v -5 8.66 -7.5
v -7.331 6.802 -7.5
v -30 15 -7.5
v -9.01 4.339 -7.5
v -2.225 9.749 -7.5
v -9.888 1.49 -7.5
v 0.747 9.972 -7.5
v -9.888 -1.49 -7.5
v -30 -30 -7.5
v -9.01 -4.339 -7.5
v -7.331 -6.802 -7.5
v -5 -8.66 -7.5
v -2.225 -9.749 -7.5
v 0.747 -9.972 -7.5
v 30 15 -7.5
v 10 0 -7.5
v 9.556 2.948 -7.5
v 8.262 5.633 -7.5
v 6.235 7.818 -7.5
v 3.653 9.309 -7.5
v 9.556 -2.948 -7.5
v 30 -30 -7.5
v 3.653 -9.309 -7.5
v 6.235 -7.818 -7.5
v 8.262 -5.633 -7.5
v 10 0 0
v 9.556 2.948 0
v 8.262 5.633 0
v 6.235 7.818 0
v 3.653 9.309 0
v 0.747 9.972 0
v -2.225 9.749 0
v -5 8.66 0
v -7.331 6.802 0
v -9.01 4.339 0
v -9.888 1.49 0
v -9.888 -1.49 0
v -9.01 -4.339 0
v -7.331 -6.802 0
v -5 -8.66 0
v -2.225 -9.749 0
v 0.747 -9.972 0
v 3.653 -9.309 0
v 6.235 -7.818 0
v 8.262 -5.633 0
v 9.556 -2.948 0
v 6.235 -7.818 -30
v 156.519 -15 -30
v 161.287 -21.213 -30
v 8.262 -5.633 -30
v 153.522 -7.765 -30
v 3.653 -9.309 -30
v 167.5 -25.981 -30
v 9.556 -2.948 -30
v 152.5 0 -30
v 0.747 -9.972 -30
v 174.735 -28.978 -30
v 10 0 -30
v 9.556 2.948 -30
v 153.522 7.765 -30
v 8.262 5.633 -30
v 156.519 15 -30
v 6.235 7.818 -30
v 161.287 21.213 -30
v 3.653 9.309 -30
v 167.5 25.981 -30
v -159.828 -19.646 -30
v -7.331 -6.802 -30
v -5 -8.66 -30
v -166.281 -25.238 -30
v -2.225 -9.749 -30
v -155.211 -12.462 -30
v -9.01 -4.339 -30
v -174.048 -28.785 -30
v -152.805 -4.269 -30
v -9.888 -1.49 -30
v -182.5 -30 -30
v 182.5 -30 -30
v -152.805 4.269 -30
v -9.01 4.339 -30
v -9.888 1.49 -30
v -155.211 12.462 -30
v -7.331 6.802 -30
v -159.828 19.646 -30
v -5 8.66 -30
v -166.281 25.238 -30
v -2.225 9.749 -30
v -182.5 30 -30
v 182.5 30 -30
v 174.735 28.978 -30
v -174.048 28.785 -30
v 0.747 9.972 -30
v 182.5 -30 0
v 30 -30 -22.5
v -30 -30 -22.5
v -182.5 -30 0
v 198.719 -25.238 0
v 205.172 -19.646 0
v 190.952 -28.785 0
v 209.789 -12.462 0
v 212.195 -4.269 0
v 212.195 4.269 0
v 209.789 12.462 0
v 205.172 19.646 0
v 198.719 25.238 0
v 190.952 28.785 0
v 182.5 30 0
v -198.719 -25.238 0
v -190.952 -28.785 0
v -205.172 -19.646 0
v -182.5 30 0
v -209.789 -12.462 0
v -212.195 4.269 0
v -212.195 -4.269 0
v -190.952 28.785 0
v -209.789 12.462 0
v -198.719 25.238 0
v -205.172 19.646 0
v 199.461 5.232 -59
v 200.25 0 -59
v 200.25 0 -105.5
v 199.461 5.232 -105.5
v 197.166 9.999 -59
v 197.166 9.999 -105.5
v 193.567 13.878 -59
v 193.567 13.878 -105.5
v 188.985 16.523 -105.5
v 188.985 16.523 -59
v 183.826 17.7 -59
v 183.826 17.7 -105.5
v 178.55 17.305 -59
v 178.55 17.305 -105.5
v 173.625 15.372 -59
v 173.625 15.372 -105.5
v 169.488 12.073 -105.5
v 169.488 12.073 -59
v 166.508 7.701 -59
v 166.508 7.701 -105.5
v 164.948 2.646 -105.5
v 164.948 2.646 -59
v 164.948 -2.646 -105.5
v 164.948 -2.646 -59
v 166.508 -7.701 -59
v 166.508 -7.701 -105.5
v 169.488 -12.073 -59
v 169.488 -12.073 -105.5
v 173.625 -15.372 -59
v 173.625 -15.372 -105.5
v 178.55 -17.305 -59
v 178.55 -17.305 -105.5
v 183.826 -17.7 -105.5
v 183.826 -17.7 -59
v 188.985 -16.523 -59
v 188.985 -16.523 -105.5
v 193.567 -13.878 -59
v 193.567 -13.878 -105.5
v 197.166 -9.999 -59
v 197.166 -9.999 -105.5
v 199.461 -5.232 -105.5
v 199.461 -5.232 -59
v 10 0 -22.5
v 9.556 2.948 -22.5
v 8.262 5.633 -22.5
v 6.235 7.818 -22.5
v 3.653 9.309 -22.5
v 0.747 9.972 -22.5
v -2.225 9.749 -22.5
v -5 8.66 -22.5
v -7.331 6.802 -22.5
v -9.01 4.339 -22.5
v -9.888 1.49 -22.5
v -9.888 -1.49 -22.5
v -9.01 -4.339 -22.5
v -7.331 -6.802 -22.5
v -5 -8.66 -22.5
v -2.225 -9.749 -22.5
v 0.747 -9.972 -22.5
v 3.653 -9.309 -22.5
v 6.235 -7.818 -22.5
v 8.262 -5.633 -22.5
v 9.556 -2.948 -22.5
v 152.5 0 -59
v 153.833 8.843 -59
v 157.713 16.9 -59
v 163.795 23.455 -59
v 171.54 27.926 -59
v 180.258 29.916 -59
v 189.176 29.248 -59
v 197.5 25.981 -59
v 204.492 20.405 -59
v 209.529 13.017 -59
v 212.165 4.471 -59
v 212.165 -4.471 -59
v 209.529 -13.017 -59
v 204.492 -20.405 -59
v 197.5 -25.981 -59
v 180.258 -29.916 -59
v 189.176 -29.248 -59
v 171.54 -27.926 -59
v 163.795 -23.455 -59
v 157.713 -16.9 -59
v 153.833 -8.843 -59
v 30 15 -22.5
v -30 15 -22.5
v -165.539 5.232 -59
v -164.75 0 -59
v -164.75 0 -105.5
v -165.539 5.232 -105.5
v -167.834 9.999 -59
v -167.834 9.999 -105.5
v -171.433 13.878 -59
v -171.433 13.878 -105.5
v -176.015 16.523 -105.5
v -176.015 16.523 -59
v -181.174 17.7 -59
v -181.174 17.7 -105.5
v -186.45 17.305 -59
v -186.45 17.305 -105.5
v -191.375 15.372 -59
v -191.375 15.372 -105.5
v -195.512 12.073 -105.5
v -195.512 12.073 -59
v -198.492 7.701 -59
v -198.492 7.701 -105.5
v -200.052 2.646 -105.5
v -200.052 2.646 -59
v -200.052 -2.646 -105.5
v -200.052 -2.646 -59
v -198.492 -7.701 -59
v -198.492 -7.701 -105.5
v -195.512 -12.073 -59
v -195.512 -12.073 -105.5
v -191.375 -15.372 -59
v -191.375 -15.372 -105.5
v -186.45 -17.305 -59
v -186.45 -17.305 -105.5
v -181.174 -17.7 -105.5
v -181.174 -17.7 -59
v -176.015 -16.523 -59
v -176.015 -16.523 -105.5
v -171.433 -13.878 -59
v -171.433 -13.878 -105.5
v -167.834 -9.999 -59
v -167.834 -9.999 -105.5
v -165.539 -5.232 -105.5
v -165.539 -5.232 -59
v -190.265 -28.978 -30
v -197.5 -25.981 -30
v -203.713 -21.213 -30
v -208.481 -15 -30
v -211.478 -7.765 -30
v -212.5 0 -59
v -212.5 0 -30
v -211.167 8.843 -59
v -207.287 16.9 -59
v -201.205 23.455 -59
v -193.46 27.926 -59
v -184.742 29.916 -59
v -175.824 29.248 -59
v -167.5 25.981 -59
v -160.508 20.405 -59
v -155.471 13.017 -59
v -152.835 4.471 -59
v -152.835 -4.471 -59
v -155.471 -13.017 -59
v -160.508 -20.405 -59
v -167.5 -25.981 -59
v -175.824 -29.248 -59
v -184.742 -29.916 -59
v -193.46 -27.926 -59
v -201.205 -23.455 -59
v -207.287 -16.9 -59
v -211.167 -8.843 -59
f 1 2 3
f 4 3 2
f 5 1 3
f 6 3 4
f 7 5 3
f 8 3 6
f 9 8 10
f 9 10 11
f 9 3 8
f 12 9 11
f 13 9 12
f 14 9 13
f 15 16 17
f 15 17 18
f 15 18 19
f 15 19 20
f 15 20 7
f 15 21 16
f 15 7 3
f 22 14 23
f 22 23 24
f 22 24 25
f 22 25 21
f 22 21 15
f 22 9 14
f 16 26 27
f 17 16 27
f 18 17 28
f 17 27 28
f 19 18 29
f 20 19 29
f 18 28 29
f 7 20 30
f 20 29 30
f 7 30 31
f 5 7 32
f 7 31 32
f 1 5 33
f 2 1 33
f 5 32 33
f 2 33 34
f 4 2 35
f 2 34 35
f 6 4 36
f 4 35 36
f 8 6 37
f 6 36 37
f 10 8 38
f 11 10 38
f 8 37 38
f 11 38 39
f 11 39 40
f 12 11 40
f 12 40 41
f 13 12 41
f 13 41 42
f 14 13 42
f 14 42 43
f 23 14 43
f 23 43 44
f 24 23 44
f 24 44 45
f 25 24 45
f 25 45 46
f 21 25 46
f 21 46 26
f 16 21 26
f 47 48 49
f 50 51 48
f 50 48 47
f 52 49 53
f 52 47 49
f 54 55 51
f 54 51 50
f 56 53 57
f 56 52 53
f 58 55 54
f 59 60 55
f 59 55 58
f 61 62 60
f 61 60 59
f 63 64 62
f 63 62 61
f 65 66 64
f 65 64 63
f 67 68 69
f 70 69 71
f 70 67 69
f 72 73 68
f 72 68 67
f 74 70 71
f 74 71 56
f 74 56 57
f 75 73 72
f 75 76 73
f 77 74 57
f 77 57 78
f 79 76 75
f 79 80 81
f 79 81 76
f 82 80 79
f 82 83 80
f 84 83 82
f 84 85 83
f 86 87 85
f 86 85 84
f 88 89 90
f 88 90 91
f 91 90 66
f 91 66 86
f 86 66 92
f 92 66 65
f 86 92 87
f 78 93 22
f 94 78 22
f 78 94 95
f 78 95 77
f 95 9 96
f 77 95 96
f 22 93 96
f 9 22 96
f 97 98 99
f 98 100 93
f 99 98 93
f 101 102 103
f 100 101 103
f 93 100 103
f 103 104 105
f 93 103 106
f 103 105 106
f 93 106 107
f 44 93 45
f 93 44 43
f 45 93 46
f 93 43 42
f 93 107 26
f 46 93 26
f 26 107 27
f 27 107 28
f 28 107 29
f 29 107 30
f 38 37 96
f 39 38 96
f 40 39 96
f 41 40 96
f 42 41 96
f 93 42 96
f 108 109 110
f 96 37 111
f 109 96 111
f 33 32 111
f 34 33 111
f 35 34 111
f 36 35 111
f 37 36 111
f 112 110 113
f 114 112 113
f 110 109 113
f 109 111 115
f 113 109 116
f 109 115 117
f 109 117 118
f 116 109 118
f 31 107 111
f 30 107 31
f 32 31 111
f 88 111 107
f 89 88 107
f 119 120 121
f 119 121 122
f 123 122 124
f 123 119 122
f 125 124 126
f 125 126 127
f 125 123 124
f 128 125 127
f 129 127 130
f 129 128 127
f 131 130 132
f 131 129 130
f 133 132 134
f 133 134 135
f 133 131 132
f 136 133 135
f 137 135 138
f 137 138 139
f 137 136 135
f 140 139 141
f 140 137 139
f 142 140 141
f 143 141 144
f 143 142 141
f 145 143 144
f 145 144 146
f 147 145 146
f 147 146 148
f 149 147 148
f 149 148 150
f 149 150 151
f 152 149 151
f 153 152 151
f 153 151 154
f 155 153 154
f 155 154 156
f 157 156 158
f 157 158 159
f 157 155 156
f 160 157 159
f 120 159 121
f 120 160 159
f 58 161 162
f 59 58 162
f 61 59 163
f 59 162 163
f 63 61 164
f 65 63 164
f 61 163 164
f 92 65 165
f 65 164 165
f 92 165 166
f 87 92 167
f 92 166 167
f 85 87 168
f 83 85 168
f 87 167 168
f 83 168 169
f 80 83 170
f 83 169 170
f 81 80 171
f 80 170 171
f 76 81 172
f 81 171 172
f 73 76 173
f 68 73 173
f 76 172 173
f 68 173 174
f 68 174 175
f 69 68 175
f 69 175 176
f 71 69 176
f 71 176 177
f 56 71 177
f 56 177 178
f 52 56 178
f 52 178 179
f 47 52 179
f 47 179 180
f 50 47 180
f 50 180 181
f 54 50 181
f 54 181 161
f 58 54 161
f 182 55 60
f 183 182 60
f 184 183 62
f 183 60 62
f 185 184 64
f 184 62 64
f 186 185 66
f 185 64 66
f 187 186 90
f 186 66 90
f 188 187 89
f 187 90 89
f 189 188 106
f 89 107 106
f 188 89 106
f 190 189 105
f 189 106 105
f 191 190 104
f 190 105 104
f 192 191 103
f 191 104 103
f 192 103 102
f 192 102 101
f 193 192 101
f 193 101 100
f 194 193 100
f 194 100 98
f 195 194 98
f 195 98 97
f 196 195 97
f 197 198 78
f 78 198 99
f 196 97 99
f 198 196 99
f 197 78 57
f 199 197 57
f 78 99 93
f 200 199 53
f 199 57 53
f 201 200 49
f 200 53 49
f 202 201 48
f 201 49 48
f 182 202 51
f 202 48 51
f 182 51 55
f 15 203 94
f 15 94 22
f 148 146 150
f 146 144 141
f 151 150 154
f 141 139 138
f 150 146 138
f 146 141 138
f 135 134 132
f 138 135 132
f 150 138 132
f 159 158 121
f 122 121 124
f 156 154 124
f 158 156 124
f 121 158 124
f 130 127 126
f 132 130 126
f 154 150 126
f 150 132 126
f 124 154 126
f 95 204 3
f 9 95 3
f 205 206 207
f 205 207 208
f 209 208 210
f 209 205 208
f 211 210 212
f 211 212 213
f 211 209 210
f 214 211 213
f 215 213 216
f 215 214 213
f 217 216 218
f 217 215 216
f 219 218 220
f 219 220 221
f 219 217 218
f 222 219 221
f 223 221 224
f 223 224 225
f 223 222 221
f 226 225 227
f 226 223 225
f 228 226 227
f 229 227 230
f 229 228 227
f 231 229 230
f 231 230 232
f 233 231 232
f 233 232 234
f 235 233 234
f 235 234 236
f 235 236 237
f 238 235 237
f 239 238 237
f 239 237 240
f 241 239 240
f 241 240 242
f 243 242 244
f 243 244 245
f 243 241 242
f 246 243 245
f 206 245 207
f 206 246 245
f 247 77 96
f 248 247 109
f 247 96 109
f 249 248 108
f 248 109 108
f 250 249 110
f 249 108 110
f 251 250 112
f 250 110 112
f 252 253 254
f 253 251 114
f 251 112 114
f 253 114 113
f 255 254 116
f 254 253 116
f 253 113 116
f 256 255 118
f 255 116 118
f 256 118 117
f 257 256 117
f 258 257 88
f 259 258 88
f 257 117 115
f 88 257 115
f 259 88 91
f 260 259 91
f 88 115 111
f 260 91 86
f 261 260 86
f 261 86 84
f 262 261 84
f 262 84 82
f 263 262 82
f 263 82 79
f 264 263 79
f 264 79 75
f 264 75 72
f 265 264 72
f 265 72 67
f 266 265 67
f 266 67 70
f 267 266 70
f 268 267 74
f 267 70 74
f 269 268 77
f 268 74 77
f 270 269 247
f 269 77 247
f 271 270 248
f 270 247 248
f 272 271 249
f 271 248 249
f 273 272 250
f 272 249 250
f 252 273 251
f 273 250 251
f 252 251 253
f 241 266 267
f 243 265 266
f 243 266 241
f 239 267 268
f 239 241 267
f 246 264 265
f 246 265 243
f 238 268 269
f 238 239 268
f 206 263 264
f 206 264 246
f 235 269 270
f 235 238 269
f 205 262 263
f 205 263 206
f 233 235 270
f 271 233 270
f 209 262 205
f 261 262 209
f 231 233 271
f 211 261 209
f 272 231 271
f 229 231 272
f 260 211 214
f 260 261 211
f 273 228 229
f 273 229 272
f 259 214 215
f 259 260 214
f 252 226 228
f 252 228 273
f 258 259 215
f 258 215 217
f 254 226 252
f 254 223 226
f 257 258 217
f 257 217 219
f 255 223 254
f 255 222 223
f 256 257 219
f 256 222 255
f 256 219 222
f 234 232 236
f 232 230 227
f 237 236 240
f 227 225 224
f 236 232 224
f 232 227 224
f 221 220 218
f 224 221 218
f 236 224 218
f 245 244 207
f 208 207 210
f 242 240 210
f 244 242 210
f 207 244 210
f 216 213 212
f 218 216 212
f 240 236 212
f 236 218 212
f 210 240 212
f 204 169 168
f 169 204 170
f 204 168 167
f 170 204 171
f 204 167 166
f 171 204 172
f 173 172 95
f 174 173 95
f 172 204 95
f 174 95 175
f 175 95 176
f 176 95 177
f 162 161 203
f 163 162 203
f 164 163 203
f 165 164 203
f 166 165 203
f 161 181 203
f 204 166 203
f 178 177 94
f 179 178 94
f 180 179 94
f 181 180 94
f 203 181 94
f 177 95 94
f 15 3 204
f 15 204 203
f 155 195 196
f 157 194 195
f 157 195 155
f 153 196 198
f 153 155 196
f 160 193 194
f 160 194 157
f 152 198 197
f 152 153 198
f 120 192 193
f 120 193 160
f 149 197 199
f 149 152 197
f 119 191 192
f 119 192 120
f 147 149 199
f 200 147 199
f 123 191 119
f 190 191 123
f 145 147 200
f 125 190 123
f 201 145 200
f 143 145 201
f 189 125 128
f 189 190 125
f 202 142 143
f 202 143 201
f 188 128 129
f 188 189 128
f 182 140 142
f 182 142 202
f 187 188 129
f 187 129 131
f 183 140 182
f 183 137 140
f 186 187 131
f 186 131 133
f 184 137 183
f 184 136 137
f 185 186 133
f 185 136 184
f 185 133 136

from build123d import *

# Parameters (mm, degrees)
BOSS_EXTRUDE1_DEPTH = 30
SKETCH2_R           = 30
BOSS_EXTRUDE2_DEPTH = 29
SKETCH1_3_R         = 10
CUT_EXTRUDE1_DEPTH  = 30
BOSS_EXTRUDE3_START = -59
SKETCH1_4_R         = 17.75
BOSS_EXTRUDE3_DEPTH = 46.5
SKETCH3_W           = 60
SKETCH3_H           = 15
CUT_EXTRUDE2_DEPTH  = 45


with BuildPart() as part:
    # Sketch1 → Boss-Extrude1 (new body)
    with BuildSketch(Plane.XY):
        with BuildLine():
            Line((-182.5, 30), (182.5, 30))
            ThreePointArc((182.5, 30), (212.5, 0), (182.5, -30))
            Line((182.5, -30), (-182.5, -30))
            ThreePointArc((-182.5, -30), (-212.5, 0), (-182.5, 30))
        make_face()
    extrude(amount=-BOSS_EXTRUDE1_DEPTH)

    # Sketch2 → Boss-Extrude2 (add)
    with BuildSketch(Plane(origin=(0, 0, -30), x_dir=(-1, 0, 0), z_dir=(0, 0, -1))):
        with Locations((-182.5, 0)):
            Circle(SKETCH2_R)
        with Locations((182.5, 0)):
            Circle(SKETCH2_R)
    extrude(amount=BOSS_EXTRUDE2_DEPTH)

    # Sketch1<3> → Cut-Extrude1 (cut)
    with BuildSketch(Plane.XY):
        Circle(SKETCH1_3_R)
    extrude(amount=-CUT_EXTRUDE1_DEPTH, mode=Mode.SUBTRACT)

    # Sketch1<4> → Boss-Extrude3 (add)
    with BuildSketch(Plane.XY.offset(BOSS_EXTRUDE3_START)):
        with Locations((182.5, 0)):
            Circle(SKETCH1_4_R)
        with Locations((-182.5, 0)):
            Circle(SKETCH1_4_R)
    extrude(amount=-BOSS_EXTRUDE3_DEPTH)

    # Sketch3 → Cut-Extrude2 (cut)
    with BuildSketch(Plane.XZ.offset(30)):
        with Locations((0, -15)):
            Rectangle(SKETCH3_W, SKETCH3_H)
    extrude(amount=-CUT_EXTRUDE2_DEPTH, mode=Mode.SUBTRACT)


solid = part.part
